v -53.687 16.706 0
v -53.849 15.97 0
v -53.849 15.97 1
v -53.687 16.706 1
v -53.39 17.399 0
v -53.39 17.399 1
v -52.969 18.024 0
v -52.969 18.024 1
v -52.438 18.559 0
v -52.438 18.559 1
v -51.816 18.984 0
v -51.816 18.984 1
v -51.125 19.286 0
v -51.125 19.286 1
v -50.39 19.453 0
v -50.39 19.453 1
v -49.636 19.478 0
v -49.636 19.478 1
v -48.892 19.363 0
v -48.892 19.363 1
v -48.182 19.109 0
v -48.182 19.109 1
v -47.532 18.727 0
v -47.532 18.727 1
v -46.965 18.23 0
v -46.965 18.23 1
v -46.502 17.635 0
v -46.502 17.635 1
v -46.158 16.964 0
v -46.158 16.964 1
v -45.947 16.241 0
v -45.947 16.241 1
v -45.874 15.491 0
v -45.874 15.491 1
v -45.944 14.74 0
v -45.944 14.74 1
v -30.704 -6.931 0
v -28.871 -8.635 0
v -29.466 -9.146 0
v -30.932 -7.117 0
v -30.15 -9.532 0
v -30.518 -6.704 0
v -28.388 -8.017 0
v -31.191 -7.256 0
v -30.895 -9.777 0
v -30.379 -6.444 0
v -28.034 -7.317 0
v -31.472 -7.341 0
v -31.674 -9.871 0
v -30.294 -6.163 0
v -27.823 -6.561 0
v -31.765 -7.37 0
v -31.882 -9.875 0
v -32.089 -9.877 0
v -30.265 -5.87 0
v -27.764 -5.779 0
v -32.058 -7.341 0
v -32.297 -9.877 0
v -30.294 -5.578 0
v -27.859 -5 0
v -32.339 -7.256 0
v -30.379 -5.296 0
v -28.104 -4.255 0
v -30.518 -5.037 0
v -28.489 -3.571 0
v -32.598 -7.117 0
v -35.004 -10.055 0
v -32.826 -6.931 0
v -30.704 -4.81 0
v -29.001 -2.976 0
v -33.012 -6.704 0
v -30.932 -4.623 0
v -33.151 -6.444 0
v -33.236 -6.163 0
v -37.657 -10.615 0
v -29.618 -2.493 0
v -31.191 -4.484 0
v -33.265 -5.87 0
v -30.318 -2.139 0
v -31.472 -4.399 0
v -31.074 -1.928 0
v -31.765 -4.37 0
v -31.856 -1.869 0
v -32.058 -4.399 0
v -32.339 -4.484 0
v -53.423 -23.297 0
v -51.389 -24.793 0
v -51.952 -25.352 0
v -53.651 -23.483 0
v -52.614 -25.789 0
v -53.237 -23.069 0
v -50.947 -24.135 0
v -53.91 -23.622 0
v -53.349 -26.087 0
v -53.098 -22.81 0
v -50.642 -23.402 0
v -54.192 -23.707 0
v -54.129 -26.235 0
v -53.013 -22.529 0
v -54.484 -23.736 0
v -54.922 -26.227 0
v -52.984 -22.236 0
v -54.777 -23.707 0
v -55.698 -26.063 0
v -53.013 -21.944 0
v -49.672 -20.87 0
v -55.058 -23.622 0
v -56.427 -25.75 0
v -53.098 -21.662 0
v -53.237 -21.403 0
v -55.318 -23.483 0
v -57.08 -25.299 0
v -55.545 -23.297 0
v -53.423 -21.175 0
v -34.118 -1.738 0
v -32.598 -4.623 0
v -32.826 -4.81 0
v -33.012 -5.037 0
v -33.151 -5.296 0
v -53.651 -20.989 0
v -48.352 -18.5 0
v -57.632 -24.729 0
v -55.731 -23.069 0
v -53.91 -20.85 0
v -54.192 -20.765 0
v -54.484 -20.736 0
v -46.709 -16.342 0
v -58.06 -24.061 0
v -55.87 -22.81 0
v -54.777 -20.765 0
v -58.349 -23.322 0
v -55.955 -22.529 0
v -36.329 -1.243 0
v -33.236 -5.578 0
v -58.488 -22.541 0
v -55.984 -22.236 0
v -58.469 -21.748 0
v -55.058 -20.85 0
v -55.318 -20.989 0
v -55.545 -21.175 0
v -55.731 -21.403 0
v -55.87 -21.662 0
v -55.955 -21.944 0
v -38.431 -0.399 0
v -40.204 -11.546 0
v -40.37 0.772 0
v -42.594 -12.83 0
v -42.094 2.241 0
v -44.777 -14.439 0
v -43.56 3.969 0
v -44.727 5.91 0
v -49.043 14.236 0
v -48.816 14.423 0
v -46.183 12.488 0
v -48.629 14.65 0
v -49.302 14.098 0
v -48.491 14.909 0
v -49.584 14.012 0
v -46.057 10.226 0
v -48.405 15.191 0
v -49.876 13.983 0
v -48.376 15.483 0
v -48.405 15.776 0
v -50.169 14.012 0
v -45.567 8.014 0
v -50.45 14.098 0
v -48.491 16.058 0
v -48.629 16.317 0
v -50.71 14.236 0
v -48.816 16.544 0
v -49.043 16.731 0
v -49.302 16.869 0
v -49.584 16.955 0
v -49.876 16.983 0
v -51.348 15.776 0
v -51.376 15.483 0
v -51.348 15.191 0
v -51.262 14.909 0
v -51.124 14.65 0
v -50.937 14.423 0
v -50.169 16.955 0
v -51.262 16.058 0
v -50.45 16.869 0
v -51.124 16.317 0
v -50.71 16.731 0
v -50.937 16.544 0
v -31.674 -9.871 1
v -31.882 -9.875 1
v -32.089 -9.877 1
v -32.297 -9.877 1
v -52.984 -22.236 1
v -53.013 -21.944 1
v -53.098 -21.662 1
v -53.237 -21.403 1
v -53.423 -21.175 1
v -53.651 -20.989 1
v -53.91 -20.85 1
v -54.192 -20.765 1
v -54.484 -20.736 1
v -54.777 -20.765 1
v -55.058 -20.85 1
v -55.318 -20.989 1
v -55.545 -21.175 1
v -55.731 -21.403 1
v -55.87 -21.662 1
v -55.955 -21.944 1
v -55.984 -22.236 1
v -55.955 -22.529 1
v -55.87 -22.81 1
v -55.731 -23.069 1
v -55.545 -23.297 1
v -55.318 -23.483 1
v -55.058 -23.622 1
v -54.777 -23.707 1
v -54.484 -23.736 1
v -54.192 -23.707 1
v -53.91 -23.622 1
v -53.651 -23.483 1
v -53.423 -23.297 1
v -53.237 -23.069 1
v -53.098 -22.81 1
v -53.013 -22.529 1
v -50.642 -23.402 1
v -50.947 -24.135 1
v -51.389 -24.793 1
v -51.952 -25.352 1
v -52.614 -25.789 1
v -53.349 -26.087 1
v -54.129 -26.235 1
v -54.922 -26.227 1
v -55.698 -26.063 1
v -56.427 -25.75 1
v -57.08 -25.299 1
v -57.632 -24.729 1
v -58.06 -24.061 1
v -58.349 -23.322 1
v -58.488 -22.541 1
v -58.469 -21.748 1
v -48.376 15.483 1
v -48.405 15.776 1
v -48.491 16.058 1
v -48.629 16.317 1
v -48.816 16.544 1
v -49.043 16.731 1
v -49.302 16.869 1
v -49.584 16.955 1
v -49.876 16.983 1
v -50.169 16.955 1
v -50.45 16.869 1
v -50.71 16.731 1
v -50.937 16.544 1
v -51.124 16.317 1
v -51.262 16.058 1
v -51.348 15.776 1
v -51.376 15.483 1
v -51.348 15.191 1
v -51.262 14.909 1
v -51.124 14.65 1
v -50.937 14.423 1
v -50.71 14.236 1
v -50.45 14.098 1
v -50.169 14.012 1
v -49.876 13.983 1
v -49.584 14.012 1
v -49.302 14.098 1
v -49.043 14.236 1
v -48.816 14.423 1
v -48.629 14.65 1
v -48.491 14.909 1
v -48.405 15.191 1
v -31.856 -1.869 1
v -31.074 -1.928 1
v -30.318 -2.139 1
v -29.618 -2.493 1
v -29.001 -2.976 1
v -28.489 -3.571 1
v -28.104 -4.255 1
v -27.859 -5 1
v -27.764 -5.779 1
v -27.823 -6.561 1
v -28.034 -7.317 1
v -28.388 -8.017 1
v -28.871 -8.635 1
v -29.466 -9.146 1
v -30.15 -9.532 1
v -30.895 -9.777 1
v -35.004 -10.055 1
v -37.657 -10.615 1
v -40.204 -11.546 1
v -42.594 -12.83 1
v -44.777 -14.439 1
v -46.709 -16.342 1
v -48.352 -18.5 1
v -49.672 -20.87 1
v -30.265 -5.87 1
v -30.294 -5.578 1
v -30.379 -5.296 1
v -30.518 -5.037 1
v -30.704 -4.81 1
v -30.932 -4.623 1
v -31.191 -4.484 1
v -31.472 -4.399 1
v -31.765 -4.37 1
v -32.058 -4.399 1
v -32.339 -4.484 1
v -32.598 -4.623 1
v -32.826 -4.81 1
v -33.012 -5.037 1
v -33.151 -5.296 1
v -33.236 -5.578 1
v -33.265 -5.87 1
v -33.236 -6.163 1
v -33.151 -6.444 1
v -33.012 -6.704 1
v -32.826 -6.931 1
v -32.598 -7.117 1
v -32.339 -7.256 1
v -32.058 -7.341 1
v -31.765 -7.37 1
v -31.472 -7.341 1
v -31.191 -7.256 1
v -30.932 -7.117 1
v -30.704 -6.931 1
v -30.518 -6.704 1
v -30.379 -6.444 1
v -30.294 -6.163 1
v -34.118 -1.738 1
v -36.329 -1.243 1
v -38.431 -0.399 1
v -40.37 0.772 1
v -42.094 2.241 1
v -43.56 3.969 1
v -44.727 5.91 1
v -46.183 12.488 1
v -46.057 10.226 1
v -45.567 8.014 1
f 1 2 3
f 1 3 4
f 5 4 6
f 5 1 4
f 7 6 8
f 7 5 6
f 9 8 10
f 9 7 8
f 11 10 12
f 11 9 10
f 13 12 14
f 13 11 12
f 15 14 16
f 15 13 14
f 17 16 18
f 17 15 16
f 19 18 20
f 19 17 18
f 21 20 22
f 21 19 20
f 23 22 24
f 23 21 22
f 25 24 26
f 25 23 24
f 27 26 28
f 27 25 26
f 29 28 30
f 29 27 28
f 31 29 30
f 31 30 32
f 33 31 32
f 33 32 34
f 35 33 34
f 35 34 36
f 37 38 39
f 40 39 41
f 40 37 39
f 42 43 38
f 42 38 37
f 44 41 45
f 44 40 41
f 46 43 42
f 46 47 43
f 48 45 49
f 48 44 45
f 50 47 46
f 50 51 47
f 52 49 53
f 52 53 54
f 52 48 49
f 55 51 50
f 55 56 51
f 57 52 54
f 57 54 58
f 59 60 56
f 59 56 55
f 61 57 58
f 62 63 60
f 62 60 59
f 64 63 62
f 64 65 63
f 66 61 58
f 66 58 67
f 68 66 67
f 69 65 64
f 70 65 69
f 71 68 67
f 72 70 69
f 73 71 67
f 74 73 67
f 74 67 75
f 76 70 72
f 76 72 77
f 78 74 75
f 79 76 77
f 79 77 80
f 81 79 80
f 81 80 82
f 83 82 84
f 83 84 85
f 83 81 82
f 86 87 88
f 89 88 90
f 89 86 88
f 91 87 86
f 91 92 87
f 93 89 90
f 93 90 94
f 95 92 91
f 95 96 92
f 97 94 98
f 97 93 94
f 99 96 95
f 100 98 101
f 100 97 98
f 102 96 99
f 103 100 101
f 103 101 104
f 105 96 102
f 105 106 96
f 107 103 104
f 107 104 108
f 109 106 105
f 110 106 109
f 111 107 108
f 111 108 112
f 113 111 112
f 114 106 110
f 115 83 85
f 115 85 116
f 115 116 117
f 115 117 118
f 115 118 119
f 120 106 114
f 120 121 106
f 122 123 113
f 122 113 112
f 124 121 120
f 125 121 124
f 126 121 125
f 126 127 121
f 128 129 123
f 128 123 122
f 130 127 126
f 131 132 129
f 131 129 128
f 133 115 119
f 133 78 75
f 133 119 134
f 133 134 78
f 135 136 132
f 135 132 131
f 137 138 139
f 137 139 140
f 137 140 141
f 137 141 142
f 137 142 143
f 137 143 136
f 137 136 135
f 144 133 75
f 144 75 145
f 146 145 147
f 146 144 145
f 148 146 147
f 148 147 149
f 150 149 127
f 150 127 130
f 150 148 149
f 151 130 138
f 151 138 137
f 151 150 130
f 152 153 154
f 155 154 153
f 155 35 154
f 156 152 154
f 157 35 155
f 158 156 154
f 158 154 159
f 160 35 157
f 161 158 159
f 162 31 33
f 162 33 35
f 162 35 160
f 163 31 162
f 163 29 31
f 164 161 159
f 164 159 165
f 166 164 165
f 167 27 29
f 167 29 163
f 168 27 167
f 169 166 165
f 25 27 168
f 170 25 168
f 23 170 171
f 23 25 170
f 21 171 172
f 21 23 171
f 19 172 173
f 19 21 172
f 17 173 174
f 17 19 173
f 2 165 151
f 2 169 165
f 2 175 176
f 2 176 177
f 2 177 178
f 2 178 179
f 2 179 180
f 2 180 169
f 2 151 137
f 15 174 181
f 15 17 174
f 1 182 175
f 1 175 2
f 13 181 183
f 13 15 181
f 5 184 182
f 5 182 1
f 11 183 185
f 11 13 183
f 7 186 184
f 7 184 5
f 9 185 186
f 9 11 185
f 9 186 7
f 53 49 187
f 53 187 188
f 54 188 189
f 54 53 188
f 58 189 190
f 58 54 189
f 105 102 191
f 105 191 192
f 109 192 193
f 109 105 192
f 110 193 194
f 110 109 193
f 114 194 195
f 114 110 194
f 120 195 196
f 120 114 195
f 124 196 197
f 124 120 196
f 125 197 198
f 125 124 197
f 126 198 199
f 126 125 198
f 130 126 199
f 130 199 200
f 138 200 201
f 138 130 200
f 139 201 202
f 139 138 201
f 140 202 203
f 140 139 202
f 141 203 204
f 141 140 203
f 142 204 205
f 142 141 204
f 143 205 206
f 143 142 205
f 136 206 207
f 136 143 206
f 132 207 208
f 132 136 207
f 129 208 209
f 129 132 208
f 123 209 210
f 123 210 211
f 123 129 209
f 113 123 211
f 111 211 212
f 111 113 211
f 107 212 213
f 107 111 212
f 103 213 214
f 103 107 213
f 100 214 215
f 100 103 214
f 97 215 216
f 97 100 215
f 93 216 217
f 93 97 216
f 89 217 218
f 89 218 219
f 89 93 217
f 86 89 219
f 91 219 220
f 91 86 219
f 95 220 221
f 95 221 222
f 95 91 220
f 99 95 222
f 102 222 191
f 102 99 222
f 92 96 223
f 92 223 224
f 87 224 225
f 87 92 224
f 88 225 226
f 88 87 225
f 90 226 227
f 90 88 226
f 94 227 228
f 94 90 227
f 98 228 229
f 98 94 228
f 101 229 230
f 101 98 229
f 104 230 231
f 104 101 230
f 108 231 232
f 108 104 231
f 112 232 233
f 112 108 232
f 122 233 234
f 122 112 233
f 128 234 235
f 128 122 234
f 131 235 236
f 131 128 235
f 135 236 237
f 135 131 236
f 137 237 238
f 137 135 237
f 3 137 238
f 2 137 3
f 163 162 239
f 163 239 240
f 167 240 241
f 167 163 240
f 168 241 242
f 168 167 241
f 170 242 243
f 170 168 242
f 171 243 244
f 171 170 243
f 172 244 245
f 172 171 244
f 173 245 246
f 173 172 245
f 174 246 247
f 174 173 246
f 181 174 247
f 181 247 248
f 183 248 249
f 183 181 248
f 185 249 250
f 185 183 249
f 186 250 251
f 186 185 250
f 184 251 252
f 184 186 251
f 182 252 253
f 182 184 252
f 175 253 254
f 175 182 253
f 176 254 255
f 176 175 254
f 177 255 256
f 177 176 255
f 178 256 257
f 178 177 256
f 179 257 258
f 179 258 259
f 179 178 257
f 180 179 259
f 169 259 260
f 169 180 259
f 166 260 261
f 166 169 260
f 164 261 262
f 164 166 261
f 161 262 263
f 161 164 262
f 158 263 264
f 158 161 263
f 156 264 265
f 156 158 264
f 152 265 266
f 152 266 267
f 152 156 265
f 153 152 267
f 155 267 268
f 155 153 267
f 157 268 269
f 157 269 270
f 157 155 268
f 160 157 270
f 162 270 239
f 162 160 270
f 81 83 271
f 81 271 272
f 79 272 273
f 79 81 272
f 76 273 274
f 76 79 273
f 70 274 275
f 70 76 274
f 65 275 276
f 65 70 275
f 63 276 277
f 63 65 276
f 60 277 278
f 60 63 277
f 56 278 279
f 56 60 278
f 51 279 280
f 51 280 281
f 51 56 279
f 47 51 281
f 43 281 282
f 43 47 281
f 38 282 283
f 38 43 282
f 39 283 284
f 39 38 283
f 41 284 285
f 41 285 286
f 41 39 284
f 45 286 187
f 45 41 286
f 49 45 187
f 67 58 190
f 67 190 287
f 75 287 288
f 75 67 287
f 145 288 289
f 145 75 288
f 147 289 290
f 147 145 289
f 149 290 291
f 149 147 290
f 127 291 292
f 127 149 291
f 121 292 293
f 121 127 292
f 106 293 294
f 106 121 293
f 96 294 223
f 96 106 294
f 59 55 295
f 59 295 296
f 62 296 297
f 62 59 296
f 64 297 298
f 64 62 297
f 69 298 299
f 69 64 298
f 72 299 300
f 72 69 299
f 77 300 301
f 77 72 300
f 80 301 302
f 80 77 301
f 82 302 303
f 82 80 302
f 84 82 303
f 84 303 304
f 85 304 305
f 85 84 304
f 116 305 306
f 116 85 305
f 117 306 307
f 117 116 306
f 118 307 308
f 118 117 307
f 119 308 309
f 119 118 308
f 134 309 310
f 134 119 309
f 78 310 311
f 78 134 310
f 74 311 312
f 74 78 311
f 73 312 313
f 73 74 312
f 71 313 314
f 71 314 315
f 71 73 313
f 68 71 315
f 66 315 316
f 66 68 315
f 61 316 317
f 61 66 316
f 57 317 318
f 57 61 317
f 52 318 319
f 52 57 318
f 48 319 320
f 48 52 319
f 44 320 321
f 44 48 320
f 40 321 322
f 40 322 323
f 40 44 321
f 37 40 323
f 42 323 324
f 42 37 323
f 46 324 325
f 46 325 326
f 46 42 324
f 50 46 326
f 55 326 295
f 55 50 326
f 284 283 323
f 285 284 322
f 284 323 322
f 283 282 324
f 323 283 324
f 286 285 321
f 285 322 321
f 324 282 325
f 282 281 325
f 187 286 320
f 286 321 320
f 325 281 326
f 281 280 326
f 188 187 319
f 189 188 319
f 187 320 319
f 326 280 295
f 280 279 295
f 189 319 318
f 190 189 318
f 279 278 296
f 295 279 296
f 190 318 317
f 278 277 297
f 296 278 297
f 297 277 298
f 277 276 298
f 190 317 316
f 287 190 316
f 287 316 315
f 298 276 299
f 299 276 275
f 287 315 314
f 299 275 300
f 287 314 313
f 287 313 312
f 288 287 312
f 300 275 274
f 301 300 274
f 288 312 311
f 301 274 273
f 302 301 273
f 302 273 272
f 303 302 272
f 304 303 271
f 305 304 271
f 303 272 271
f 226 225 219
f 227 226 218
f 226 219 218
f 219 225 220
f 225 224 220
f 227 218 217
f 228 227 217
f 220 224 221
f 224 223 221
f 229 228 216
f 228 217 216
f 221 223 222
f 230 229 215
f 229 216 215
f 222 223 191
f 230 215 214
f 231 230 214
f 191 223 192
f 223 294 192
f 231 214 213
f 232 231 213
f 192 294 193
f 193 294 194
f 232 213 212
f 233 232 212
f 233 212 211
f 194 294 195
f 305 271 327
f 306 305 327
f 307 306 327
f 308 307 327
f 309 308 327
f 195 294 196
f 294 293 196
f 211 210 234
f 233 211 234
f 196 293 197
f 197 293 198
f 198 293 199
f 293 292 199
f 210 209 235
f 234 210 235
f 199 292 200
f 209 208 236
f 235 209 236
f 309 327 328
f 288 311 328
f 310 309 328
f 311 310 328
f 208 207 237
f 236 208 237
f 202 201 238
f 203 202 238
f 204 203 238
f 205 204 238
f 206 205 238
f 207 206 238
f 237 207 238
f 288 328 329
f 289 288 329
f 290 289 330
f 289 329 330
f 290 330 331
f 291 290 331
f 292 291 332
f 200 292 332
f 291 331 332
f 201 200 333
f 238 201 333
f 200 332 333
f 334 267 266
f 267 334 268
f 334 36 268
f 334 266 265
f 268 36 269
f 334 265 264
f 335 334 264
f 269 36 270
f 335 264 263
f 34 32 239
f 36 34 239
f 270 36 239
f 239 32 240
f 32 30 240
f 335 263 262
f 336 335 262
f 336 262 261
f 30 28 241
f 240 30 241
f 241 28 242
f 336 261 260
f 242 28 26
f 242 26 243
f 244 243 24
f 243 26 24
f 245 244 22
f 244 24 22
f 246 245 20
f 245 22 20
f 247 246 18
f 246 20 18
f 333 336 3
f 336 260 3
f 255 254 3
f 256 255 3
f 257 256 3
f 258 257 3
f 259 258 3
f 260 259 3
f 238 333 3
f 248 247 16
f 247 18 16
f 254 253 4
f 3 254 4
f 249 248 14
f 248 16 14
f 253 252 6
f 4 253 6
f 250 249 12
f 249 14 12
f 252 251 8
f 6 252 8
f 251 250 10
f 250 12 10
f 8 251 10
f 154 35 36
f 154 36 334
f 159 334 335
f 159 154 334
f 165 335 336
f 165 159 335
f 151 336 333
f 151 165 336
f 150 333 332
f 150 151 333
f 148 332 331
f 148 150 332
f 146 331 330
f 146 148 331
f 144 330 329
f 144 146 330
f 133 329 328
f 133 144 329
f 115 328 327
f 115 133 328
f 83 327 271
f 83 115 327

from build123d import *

# Parameters (mm, degrees)
ESQUISSE1_R               = 1.5
T_LE_DE_BASE_PLI_E1_DEPTH = 1


# Sheet-metal steps are written as plain solids
with BuildPart() as part:
    # Esquisse1 → Tôle de base pliée1 (new body)
    with BuildSketch(Plane.XY):
        with BuildLine():
            Line((-58.469338958, -21.747952398), (-53.848876988, 15.970095876))
            ThreePointArc((-53.848876988, 15.970095876), (-49.26123741, 19.438010656), (-45.943968874, 14.740287881))
            ThreePointArc((-45.943968874, 14.740287881), (-42.861840407, 3.075501185), (-31.856499609, -1.869115936))
            ThreePointArc((-31.856499609, -1.869115936), (-27.76403967, -5.778781082), (-31.673704815, -9.871241021))
            ThreePointArc((-31.673704815, -9.871241021), (-31.985478135, -9.876154218), (-32.297289768, -9.876651277))
            ThreePointArc((-32.297289768, -9.876651277), (-43.713897158, -13.595668804), (-50.642240989, -23.40220068))
            ThreePointArc((-50.642240989, -23.40220068), (-55.314375936, -26.164336213), (-58.469338958, -21.747952398))
        make_face()
        with Locations((-54.484155586, -22.236137473)):
            Circle(ESQUISSE1_R, mode=Mode.SUBTRACT)
        with Locations((-31.765102212, -5.870178479)):
            Circle(ESQUISSE1_R, mode=Mode.SUBTRACT)
        with Locations((-49.876465203, 15.483475321)):
            Circle(ESQUISSE1_R, mode=Mode.SUBTRACT)
    extrude(amount=T_LE_DE_BASE_PLI_E1_DEPTH)


solid = part.part
